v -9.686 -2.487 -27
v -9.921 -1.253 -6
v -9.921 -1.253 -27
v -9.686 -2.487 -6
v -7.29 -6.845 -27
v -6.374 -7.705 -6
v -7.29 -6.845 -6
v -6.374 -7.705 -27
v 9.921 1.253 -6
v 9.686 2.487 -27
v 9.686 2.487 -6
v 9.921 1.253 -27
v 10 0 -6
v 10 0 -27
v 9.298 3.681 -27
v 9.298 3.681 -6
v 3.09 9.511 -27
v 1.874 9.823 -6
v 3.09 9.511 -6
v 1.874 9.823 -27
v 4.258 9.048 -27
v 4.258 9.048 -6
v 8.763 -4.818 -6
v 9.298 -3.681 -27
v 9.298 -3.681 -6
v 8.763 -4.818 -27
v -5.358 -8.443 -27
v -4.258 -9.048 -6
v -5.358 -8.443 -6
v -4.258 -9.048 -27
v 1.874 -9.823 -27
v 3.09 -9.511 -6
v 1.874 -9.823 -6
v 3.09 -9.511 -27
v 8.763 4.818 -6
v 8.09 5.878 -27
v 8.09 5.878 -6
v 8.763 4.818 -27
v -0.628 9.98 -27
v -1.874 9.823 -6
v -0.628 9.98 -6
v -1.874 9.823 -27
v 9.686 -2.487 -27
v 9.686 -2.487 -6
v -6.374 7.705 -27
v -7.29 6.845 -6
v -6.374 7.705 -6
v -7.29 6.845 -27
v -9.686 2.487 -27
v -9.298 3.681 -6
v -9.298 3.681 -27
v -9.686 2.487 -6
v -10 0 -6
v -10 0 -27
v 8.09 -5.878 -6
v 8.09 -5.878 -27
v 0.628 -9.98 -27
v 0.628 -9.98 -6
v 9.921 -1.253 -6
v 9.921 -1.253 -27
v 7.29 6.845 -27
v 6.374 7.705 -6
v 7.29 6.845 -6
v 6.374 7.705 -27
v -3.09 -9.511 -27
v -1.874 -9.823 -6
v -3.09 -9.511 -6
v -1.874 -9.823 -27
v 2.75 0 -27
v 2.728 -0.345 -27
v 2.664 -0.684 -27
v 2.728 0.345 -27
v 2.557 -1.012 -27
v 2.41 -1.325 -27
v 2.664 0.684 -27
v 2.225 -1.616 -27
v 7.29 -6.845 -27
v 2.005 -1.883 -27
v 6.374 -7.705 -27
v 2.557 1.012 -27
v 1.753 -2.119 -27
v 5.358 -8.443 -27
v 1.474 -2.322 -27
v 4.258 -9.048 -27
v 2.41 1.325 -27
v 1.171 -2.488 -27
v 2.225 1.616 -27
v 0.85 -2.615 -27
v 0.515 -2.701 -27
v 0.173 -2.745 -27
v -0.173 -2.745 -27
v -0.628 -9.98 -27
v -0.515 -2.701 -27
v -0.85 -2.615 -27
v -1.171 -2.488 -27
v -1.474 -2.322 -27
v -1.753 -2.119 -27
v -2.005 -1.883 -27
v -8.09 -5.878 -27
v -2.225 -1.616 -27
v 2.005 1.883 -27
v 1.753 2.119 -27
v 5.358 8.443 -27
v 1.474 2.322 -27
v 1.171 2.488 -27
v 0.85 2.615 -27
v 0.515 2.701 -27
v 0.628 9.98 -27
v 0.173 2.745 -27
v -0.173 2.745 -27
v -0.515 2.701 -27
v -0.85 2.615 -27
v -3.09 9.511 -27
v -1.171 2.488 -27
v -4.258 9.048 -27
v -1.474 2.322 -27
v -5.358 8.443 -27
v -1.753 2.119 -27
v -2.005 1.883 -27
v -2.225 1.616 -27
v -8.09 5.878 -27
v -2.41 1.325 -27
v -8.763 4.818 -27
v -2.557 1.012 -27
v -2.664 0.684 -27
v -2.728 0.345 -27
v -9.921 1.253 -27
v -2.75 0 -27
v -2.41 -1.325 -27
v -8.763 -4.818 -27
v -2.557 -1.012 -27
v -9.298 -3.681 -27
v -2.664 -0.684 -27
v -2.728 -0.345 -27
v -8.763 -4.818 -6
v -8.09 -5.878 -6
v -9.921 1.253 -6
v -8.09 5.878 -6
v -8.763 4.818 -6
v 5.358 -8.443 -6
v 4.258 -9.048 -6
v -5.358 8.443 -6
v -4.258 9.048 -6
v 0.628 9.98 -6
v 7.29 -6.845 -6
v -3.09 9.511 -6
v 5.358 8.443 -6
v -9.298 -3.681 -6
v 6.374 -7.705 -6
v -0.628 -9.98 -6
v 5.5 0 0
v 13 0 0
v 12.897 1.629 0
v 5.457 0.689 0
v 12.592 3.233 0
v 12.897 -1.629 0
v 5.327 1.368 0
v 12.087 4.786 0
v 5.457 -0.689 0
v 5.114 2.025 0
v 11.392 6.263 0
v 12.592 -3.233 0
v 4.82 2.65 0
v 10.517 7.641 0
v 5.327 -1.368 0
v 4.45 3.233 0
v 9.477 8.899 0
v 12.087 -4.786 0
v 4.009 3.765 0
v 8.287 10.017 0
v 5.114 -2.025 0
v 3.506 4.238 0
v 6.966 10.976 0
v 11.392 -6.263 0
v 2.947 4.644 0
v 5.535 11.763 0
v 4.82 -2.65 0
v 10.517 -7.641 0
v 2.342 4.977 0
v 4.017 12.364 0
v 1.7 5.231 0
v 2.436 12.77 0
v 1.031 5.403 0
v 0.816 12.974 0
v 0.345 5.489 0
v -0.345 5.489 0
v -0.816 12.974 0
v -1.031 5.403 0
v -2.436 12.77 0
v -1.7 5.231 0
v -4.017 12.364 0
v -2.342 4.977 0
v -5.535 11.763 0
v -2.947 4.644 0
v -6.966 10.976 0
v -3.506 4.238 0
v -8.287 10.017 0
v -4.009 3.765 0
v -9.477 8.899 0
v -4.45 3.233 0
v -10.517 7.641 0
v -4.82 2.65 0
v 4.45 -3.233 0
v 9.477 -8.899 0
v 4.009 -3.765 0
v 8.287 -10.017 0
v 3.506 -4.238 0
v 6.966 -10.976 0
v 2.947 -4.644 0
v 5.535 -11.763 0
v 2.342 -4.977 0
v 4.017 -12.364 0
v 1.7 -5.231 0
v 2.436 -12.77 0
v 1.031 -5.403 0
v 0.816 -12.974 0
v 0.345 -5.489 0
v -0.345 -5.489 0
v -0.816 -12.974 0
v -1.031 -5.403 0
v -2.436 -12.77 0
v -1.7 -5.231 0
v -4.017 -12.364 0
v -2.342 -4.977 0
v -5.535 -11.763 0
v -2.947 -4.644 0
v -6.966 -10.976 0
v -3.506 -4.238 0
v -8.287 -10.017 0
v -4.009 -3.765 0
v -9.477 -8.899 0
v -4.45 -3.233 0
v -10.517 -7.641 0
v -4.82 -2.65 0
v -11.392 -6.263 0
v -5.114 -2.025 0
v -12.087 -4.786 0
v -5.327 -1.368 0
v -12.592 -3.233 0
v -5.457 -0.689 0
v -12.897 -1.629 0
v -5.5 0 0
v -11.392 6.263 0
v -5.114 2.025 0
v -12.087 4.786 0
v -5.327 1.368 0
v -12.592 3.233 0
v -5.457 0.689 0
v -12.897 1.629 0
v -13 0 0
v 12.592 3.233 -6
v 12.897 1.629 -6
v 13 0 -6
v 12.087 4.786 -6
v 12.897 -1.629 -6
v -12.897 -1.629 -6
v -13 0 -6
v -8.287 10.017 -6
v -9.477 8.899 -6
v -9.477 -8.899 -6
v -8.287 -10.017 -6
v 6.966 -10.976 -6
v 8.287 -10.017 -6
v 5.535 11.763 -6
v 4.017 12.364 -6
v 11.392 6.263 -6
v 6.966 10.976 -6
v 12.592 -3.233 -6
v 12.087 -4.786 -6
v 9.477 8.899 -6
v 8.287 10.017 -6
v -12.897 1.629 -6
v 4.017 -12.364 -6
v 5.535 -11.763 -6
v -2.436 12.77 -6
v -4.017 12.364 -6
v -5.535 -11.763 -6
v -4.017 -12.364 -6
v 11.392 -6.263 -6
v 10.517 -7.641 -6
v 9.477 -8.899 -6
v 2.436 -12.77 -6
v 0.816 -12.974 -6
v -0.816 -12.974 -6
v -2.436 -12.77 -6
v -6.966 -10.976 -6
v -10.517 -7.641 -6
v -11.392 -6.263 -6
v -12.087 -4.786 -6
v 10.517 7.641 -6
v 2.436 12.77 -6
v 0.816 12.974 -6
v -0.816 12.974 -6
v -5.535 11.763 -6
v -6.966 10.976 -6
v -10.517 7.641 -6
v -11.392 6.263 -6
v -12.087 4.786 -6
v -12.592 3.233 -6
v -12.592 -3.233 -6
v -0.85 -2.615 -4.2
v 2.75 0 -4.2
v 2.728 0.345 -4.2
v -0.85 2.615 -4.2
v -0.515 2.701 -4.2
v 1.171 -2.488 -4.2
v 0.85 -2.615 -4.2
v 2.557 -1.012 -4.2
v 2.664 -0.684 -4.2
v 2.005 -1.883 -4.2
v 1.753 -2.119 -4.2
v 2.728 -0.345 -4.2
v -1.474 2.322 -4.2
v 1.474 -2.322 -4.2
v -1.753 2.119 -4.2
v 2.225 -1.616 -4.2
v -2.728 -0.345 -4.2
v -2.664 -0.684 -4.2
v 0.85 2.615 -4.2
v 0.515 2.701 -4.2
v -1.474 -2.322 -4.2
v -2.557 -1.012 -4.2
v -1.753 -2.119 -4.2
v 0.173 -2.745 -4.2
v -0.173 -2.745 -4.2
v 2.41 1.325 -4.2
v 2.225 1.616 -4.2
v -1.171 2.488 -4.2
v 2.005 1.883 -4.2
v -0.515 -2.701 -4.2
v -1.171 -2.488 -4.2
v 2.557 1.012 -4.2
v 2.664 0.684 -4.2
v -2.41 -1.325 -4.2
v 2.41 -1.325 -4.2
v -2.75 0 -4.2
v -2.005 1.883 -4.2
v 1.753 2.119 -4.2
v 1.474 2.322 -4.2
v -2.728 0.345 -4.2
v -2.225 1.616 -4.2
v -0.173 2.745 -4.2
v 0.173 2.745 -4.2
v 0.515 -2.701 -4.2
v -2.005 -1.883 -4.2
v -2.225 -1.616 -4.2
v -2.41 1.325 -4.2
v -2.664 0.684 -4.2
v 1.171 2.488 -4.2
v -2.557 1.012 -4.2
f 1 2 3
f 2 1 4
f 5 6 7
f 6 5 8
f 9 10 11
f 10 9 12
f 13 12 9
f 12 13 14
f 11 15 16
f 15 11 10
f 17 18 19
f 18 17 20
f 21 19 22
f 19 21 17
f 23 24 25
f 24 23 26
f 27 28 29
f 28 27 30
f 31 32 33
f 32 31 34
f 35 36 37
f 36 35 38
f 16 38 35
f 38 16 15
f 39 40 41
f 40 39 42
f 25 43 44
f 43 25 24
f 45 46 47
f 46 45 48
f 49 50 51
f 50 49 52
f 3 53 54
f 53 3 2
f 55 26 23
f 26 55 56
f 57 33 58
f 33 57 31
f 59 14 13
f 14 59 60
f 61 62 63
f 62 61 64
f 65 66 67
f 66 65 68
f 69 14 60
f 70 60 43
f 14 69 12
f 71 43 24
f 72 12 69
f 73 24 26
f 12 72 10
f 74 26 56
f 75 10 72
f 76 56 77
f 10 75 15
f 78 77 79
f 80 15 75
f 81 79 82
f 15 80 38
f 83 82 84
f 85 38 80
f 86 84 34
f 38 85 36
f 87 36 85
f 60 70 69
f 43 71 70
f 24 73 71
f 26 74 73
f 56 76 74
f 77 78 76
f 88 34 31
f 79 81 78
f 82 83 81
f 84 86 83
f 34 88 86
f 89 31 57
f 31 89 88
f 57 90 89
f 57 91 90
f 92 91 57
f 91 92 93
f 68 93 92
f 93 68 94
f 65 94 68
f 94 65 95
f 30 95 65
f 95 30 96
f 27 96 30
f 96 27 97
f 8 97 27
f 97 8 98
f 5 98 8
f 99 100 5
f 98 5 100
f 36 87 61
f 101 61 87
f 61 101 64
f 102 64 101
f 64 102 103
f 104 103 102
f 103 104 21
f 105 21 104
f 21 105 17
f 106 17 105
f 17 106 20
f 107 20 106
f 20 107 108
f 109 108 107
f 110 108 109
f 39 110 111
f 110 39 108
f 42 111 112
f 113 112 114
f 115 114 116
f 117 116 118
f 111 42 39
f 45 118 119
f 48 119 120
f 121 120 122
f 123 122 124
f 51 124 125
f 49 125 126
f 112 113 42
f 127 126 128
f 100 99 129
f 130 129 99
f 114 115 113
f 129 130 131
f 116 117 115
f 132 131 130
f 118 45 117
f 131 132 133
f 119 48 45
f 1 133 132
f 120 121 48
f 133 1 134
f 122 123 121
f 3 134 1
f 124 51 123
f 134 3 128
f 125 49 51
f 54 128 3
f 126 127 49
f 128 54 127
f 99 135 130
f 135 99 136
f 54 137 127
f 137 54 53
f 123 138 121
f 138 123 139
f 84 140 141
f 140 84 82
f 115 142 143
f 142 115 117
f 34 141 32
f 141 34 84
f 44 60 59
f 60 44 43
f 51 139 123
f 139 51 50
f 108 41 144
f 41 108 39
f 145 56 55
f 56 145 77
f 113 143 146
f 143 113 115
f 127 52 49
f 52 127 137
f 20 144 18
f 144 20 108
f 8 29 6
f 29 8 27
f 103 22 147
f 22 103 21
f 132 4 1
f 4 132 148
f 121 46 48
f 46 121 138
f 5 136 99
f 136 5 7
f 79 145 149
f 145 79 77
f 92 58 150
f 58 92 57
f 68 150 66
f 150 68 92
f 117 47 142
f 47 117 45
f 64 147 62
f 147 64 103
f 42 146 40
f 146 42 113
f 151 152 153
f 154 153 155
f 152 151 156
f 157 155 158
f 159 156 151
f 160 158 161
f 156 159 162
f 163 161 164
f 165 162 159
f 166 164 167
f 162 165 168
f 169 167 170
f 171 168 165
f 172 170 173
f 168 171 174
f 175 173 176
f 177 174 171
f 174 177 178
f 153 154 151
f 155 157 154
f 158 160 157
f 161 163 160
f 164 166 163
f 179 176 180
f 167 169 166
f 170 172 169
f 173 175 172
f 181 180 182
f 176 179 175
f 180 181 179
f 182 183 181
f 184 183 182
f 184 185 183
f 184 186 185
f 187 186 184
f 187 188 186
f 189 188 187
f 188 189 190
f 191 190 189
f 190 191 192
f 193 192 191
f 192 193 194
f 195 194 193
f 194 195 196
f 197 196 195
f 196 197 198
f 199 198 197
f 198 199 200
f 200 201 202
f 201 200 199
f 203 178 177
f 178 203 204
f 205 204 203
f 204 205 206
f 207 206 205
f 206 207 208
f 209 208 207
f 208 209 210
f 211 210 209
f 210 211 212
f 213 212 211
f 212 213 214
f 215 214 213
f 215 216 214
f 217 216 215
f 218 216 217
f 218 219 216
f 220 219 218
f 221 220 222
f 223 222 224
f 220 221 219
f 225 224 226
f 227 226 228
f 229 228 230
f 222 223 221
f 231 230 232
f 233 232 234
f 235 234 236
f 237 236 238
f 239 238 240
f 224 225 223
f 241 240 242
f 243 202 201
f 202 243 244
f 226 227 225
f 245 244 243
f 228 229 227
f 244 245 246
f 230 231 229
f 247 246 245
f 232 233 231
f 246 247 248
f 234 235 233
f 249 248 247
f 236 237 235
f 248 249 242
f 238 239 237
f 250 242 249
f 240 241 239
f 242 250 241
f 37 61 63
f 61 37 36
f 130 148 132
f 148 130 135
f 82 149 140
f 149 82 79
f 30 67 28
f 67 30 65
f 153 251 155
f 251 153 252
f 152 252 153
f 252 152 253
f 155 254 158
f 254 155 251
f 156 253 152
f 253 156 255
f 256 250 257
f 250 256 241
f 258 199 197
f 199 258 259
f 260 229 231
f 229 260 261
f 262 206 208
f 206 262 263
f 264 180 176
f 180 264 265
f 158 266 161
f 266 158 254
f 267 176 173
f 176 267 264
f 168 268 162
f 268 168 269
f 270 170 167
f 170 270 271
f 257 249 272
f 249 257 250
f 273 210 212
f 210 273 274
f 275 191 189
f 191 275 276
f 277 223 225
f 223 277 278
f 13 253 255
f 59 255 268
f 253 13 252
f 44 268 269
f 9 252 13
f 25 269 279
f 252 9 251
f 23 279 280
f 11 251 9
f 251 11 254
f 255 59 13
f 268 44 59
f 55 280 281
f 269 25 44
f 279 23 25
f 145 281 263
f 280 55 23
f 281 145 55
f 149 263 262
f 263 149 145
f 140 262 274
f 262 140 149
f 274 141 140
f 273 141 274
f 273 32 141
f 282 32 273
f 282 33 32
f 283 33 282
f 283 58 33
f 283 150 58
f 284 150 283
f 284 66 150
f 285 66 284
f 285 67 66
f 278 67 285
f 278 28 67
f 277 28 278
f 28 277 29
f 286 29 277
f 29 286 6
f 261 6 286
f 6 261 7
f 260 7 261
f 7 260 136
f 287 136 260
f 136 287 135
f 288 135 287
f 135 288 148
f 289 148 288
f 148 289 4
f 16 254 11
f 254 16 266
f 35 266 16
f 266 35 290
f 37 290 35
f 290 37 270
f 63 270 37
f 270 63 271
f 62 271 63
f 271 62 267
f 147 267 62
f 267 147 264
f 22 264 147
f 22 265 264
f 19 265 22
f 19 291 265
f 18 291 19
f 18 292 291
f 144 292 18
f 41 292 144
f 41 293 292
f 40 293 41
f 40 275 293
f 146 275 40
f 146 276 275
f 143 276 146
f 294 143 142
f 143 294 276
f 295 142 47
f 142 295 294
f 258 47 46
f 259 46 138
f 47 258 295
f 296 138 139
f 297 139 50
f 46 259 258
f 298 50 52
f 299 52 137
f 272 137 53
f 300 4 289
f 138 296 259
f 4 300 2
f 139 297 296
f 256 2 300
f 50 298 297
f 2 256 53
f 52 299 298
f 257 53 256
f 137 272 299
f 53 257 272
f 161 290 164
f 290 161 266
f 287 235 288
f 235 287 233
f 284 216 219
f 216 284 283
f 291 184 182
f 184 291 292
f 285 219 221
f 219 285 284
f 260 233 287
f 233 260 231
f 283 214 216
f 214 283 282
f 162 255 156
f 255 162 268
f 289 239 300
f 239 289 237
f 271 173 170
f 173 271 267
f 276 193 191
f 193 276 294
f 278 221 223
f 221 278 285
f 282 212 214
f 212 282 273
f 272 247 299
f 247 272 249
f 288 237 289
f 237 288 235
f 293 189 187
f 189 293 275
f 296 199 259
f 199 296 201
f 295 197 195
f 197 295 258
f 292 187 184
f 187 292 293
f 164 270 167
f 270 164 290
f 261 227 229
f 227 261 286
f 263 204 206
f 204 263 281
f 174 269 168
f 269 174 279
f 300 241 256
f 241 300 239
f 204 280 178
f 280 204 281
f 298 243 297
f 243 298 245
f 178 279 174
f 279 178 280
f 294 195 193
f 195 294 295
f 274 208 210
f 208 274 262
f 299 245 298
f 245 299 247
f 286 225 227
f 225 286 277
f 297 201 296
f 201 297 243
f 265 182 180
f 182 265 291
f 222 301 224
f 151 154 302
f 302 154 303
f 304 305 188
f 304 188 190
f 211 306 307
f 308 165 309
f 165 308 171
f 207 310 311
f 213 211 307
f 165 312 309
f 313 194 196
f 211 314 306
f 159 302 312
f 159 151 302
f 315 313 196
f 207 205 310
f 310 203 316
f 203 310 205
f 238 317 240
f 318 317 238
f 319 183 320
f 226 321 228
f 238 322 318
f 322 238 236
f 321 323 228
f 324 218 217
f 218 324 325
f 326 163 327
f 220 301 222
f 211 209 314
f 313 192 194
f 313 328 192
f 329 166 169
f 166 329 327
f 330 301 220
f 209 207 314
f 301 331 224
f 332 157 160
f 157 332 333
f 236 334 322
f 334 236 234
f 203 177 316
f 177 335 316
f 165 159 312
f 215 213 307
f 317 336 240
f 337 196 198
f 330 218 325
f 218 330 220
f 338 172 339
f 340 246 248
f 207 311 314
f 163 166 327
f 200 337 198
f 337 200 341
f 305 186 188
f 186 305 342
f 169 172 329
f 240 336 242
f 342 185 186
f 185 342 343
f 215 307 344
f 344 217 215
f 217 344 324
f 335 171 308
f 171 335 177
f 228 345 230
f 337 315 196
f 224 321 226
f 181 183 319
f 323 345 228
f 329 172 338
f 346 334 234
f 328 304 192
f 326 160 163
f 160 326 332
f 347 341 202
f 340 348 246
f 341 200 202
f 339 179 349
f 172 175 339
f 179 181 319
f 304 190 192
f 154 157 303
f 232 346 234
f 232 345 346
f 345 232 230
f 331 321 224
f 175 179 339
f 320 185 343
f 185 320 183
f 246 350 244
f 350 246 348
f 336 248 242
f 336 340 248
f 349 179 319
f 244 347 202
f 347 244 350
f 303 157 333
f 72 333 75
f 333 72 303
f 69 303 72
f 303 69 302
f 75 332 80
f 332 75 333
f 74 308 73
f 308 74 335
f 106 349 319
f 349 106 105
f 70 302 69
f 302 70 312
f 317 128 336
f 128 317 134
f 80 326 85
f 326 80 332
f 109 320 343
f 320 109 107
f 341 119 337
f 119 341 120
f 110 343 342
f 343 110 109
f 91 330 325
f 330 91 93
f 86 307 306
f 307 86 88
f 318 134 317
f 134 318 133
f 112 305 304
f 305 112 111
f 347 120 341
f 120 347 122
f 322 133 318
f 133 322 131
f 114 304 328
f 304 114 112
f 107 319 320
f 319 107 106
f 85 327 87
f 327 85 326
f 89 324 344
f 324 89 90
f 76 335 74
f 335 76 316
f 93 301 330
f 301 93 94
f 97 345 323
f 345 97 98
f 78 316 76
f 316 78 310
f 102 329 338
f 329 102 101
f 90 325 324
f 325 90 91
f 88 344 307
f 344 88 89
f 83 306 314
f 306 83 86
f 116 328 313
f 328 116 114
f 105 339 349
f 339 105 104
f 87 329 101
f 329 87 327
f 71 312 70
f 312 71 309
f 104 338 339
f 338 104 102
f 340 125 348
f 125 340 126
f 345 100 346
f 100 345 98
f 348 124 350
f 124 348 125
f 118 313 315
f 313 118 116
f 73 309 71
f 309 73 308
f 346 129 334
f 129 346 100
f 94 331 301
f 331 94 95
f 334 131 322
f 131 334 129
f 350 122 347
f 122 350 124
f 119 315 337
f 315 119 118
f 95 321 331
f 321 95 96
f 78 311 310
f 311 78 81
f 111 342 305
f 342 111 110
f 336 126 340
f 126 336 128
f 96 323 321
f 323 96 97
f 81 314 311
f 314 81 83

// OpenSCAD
$fn = 50;


difference() {
	union() {
		translate(v = [0, 0, -27.0000000000]) {
			cylinder(h = 27, r = 10.0000000000);
		}
		translate(v = [0, 0, -6.0000000000]) {
			cylinder(h = 6, r = 13.0000000000);
		}
	}
	union() {
		translate(v = [0, 0, 0]) {
			rotate(a = [0, 0, 0]) {
				difference() {
					union() {
						#translate(v = [0, 0, -27.0000000000]) {
							cylinder(h = 27, r = 2.2500000000);
						}
						#translate(v = [0, 0, -4.2000000000]) {
							cylinder(h = 4.2000000000, r = 10.0000000000, r1 = 2.7500000000, r2 = 5.5000000000);
						}
						#translate(v = [0, 0, -27.0000000000]) {
							cylinder(h = 27, r = 2.7500000000);
						}
						#translate(v = [0, 0, -27.0000000000]) {
							cylinder(h = 27, r = 2.2500000000);
						}
					}
					union();
				}
			}
		}
	}
}
